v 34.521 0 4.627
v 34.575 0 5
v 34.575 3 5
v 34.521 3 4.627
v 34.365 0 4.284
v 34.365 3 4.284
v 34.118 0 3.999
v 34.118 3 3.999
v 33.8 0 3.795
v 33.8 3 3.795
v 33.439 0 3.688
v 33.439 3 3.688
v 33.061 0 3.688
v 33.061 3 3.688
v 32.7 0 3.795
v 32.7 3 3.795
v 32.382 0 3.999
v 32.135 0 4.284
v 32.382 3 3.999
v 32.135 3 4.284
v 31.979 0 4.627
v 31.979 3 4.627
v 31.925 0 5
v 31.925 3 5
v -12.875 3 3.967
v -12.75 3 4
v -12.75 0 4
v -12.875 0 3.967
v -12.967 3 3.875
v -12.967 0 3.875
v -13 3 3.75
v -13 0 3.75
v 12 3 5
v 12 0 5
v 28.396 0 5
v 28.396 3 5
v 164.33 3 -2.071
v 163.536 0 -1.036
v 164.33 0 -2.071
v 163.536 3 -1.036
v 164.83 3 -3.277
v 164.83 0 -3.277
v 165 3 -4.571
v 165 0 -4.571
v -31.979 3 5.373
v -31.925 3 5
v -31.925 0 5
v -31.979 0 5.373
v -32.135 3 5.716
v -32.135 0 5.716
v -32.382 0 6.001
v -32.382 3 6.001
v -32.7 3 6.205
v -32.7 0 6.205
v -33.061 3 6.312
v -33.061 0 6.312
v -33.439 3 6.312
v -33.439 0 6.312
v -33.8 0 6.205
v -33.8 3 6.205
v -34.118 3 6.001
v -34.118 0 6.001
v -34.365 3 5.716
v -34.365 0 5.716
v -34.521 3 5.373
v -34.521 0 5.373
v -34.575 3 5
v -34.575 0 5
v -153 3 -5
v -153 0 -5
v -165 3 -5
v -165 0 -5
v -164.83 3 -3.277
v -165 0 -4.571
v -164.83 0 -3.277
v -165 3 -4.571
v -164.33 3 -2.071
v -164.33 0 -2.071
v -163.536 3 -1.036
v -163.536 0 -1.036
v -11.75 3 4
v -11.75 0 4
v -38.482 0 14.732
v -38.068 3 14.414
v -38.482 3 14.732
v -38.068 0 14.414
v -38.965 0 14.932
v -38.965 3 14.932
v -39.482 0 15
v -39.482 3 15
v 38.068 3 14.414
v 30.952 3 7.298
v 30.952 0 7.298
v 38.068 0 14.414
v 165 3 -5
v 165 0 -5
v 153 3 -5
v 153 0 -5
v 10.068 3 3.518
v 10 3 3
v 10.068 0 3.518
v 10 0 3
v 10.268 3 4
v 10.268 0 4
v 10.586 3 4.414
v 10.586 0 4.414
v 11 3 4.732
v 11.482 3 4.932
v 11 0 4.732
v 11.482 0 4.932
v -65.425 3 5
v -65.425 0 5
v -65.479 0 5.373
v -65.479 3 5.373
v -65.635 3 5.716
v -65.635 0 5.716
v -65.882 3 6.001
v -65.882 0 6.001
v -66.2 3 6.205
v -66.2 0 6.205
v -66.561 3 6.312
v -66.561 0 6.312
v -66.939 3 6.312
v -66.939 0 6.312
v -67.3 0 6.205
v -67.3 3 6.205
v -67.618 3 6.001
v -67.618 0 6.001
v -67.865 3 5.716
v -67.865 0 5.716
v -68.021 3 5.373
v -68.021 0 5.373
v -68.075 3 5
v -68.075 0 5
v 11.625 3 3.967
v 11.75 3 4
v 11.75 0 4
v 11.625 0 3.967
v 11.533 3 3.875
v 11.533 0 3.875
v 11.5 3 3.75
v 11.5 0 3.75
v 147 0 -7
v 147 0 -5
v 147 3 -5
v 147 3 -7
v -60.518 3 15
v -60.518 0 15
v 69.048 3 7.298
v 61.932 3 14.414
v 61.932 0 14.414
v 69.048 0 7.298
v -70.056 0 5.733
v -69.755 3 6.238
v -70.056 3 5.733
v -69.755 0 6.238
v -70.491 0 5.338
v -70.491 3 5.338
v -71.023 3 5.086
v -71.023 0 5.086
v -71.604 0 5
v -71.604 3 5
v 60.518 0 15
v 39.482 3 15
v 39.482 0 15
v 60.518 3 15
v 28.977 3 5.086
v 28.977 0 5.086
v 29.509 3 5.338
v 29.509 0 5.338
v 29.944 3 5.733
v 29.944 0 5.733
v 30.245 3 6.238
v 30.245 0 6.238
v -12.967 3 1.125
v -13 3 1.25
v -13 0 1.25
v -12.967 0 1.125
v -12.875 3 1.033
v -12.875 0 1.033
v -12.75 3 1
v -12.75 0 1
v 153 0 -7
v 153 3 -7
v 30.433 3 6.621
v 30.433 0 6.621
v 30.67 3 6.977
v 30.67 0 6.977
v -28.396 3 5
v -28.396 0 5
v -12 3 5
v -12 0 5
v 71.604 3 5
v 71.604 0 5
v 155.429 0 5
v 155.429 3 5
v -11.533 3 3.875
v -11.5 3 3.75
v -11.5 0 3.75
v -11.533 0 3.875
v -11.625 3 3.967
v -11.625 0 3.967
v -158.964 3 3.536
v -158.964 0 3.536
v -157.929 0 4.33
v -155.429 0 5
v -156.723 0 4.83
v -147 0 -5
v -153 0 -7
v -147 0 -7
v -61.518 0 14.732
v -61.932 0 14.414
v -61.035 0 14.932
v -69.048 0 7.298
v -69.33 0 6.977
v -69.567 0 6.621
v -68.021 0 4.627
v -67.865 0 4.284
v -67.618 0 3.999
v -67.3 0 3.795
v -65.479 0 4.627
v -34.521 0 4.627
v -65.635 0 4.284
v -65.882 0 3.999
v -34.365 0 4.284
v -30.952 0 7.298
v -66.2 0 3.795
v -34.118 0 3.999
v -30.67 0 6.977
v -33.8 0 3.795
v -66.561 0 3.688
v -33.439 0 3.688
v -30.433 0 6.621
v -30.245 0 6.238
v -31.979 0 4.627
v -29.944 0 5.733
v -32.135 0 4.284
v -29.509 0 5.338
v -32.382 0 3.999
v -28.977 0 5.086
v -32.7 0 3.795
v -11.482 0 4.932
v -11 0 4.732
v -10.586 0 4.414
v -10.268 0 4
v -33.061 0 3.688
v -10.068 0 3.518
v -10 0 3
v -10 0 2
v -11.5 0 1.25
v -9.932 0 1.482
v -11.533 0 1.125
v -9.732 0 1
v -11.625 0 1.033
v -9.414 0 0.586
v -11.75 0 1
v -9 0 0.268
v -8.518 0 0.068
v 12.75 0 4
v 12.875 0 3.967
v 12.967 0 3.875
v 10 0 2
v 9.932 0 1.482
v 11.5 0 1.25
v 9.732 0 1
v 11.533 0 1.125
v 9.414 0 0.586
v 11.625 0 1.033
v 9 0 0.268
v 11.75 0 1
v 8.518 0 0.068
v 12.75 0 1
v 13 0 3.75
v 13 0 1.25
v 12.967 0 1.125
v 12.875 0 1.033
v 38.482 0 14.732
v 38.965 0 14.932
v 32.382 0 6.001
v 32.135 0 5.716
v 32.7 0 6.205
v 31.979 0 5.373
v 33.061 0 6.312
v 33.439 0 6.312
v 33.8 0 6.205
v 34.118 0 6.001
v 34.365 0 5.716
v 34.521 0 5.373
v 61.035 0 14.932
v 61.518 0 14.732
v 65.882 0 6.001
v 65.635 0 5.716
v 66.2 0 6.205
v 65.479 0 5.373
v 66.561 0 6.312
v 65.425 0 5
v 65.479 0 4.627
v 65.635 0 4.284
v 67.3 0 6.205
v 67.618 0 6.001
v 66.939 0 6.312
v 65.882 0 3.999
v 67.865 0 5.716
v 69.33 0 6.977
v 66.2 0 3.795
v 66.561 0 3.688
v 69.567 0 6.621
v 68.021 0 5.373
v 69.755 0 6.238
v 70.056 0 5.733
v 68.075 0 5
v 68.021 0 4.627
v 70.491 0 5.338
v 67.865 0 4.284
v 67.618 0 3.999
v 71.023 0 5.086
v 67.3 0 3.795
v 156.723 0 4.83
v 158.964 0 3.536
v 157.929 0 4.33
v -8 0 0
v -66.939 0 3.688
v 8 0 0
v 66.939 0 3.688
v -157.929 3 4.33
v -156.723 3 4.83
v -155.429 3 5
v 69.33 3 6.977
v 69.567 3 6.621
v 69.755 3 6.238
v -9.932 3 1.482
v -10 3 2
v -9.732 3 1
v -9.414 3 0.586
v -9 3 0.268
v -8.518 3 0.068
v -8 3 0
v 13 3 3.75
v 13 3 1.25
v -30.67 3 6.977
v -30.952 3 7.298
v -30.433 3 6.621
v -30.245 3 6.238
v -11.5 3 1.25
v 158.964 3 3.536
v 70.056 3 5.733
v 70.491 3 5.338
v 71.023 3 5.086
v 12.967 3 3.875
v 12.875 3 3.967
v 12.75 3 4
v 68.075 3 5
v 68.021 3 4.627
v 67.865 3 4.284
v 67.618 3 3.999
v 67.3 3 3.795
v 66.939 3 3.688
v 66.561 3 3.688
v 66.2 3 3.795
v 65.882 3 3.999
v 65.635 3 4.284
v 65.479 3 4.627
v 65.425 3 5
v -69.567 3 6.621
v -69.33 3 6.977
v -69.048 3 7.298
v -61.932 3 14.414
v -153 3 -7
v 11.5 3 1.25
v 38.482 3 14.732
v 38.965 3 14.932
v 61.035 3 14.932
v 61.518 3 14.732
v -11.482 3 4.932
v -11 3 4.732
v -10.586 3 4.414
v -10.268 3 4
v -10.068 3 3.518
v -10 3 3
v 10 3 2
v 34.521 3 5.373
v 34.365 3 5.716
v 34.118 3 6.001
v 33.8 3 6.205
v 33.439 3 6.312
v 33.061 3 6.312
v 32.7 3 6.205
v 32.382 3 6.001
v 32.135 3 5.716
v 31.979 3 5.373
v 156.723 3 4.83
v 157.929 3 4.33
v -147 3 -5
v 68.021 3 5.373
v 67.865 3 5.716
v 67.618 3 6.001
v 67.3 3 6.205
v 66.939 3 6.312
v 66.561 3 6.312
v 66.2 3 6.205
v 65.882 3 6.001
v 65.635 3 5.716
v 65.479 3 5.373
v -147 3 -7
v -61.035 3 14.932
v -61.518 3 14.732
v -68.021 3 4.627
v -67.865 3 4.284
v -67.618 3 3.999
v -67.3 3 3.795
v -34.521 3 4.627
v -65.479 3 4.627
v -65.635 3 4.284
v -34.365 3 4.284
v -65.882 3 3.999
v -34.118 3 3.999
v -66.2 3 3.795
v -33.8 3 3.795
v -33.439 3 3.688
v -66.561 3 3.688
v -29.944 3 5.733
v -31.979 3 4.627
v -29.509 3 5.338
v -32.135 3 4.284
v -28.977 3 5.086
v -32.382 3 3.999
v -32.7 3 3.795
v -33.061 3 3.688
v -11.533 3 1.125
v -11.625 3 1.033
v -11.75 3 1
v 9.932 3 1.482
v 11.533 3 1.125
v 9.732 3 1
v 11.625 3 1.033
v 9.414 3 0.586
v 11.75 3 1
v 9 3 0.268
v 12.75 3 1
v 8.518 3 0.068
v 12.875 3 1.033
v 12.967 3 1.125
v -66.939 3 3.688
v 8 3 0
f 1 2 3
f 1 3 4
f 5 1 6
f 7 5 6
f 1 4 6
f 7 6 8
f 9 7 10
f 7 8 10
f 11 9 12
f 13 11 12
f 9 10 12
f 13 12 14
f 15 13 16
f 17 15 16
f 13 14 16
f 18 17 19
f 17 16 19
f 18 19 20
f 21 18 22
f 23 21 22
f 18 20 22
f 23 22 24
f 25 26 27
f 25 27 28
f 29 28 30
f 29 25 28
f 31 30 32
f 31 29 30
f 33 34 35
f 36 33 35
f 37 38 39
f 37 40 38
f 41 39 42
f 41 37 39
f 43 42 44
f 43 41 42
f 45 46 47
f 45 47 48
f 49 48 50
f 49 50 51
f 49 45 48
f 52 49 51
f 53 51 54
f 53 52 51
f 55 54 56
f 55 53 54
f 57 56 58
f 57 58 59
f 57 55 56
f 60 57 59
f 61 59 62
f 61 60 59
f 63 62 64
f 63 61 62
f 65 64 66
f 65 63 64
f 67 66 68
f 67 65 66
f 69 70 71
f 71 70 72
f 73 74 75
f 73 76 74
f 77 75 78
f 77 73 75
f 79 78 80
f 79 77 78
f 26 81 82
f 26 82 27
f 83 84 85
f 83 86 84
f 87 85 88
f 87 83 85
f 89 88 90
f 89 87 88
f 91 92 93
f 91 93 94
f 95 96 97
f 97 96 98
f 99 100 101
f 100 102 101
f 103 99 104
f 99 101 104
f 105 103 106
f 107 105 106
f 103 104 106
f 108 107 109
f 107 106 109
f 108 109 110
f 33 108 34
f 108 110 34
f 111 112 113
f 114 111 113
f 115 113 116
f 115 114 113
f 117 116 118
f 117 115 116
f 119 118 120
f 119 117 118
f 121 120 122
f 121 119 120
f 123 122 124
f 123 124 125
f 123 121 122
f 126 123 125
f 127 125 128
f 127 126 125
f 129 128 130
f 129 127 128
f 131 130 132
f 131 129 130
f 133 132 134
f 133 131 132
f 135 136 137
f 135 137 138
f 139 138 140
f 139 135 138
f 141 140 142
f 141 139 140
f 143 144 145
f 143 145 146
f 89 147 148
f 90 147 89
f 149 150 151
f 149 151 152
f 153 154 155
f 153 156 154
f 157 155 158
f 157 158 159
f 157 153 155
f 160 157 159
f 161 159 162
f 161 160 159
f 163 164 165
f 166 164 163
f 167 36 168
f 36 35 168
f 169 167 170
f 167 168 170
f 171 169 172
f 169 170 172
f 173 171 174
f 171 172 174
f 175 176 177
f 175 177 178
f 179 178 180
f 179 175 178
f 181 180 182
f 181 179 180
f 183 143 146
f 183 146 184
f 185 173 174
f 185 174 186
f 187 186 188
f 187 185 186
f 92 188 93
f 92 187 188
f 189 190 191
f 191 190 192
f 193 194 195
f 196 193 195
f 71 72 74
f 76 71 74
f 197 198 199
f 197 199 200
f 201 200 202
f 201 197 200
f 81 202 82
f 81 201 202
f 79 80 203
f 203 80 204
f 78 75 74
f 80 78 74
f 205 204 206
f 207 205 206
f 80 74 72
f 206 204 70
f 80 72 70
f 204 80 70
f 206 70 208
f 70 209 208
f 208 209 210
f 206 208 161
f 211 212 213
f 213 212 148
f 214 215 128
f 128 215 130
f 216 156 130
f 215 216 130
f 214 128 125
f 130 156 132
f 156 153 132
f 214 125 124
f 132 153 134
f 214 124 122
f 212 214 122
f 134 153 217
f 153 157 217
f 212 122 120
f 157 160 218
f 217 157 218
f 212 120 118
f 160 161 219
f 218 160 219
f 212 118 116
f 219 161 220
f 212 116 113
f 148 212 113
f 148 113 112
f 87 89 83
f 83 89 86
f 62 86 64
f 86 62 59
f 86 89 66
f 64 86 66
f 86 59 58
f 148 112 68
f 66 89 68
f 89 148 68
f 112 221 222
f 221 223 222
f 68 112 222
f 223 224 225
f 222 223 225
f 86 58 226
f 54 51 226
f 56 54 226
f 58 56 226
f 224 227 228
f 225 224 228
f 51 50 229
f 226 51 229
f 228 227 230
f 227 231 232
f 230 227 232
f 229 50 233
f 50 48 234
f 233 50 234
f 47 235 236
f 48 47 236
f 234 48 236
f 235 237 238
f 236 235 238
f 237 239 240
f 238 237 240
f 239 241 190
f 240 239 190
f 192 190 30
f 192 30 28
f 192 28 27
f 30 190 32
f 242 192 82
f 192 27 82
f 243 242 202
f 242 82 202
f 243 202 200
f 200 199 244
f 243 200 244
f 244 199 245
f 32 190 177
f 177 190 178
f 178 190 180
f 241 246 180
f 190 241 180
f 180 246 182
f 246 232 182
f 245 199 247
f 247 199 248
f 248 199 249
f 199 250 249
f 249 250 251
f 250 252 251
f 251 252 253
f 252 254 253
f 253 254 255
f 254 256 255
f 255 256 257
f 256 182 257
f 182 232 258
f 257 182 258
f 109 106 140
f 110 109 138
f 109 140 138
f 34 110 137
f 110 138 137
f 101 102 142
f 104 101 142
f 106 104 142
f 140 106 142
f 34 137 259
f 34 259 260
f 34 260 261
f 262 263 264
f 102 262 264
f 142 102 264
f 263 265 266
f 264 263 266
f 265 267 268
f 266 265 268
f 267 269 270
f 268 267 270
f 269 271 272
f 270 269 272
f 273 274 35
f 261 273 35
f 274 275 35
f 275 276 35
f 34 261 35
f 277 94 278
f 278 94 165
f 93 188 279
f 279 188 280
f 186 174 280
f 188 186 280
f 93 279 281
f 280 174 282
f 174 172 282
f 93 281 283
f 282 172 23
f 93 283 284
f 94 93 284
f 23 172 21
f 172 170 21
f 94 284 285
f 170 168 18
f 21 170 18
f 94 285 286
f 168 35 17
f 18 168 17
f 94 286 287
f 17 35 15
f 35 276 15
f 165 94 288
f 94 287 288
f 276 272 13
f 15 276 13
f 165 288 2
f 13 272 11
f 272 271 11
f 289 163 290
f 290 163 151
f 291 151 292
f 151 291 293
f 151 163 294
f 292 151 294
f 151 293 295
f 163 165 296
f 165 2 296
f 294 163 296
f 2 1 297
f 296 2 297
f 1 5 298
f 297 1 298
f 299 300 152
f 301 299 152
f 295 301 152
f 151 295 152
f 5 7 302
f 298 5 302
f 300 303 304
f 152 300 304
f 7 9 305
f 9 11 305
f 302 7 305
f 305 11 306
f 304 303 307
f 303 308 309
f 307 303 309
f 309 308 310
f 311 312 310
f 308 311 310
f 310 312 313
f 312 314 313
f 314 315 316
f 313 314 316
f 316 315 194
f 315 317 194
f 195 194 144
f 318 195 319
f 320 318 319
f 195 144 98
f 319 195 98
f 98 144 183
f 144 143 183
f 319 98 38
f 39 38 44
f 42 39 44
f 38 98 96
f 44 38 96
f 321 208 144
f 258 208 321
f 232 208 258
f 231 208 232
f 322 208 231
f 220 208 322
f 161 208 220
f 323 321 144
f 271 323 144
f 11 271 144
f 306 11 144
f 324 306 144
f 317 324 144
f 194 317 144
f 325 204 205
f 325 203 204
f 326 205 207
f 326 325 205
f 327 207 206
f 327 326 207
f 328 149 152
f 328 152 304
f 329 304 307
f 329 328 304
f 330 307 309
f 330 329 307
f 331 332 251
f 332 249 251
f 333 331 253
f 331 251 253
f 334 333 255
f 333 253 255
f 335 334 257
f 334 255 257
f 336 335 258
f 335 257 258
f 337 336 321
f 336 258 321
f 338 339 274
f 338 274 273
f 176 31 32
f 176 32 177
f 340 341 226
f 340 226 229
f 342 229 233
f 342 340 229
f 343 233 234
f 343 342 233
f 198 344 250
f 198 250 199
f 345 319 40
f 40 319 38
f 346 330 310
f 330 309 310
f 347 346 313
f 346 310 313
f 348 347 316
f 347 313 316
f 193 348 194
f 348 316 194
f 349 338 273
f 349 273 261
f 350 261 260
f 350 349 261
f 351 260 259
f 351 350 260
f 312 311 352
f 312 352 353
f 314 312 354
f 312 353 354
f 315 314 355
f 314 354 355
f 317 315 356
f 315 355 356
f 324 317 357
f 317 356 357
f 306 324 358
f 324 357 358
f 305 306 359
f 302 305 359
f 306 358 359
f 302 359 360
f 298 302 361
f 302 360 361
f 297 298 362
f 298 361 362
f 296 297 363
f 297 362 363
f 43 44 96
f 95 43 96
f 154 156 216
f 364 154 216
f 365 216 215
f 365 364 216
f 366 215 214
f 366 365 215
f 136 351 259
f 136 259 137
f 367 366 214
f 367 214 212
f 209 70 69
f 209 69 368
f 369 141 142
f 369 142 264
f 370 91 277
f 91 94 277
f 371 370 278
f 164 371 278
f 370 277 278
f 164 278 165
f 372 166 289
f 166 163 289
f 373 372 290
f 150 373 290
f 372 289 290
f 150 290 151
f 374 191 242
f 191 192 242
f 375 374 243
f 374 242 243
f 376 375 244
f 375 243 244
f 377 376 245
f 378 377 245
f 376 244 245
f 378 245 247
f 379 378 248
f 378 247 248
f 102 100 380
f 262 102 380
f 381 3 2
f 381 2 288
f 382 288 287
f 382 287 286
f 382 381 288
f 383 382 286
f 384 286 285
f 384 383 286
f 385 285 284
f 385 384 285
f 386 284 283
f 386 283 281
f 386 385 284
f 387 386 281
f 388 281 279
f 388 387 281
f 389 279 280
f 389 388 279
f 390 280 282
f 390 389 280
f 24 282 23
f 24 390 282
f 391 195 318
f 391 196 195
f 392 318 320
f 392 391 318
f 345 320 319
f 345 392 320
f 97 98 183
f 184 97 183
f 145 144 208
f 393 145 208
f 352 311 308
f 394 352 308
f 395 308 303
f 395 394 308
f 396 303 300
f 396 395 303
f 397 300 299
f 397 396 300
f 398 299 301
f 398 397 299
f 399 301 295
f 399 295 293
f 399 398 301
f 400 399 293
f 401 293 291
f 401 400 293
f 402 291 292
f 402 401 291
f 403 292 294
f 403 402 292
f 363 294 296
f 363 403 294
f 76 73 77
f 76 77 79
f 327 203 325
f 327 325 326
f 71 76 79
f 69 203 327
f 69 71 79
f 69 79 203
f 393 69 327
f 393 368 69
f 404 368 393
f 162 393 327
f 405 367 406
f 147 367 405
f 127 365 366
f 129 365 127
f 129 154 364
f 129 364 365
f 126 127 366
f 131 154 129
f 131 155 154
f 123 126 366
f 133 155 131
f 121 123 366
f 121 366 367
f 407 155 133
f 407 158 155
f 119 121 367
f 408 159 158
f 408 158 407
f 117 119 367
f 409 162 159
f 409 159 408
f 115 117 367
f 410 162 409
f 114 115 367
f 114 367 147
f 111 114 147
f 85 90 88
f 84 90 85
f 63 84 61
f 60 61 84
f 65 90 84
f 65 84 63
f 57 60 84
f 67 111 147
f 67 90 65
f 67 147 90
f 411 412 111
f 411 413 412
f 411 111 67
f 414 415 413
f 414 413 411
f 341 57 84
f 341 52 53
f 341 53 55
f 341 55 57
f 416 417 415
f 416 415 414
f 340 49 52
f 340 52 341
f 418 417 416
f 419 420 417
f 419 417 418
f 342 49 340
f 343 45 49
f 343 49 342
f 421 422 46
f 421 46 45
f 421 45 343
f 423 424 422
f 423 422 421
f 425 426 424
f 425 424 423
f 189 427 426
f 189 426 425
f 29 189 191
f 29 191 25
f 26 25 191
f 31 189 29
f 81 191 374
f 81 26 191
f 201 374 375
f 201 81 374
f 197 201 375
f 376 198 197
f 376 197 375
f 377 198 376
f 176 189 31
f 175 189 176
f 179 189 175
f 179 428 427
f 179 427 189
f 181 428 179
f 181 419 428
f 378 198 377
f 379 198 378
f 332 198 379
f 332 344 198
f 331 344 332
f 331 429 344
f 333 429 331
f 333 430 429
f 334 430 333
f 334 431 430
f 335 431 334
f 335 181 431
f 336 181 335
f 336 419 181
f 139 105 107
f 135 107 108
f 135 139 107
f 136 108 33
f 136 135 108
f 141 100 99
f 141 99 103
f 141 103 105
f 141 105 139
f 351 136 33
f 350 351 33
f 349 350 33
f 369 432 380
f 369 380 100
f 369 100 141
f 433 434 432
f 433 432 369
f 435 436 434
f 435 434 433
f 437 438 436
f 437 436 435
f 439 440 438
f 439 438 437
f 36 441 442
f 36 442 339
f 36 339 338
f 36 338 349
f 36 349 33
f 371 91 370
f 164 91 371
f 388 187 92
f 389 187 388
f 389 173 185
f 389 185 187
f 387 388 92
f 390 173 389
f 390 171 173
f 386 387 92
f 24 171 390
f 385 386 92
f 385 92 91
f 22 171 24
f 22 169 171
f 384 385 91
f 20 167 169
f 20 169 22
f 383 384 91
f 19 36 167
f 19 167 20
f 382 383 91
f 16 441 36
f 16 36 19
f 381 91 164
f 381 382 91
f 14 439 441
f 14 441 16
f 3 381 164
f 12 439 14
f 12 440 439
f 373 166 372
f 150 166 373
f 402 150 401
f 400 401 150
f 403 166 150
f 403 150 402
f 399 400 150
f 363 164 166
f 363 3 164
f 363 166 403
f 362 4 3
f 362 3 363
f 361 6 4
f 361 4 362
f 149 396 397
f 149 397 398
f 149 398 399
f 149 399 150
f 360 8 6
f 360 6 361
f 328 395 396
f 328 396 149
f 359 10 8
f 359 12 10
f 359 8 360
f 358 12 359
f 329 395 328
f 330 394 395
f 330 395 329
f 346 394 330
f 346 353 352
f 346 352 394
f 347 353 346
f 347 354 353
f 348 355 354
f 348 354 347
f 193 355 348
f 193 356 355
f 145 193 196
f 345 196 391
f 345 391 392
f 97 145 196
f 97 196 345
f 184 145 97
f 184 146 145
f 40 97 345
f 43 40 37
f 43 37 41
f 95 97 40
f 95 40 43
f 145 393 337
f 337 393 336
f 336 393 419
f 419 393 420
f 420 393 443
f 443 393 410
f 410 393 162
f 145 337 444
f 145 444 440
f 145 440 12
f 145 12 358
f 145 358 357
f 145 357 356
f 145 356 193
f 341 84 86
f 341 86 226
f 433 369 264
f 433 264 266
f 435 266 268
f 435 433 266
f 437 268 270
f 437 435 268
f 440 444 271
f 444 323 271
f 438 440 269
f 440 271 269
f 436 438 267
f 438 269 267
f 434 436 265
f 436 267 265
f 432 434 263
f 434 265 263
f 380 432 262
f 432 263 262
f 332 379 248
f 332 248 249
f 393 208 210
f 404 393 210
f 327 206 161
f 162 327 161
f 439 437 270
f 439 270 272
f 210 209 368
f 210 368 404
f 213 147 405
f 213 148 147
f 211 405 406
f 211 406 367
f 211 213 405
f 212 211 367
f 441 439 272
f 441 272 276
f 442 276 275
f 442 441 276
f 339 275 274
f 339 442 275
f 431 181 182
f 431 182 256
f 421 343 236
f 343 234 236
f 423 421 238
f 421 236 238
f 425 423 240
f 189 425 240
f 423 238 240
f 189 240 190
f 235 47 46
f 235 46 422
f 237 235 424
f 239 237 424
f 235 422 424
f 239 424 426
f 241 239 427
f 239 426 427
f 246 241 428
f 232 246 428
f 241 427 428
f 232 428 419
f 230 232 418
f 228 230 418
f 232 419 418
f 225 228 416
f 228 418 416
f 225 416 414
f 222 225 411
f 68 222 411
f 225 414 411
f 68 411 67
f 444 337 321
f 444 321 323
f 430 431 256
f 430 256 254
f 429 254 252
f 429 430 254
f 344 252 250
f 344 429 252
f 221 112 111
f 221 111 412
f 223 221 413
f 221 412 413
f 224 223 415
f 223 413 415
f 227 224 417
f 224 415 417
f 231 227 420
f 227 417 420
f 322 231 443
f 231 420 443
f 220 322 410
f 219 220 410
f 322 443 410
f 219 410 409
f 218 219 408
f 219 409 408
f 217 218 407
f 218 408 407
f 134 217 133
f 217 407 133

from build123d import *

# Parameters (mm, degrees)
SKETCH1_W           = 6
SKETCH1_H           = 2
BOSS_EXTRUDE1_DEPTH = 3
FILLET1_R           = 5
BOSS_EXTRUDE2_DEPTH = 3
CUT_EXTRUDE1_REACH  = 167.708
SKETCH3_R           = 1.325
SKETCH3_W           = 20
SKETCH3_H           = 5
FILLET2_R           = 2
FILLET3_R           = 2


with BuildPart() as part:
    # Sketch1 → Boss-Extrude1 (new body)
    with BuildSketch(Plane(origin=(0, 0, 0), x_dir=(1, 0, 0), z_dir=(0, 1, 0))):
        Polygon((-153, 5), (-165, 5), (-165, 2.5), (-157.5, -5), (157.5, -5), (165, 2.5), (165, 5), (153, 5), (147, 5), (-147, 5), align=None)
        with Locations((-150, 6)):
            Rectangle(SKETCH1_W, SKETCH1_H)
        with Locations((150, 6)):
            Rectangle(SKETCH1_W, SKETCH1_H)
    extrude(amount=BOSS_EXTRUDE1_DEPTH)

    # Fillet1
    fillet1_edges = [part.edges().sort_by_distance(p)[0] for p in [
        (157.5, 1.5, 5),
        (-157.5, 1.5, 5),
        (-165, 1.5, -2.5),
        (165, 1.5, -2.5),
    ]]
    fillet(fillet1_edges, radius=FILLET1_R)

    # Sketch2 → Boss-Extrude2 (add)
    with BuildSketch(Plane(origin=(0, 3, 0), x_dir=(1, 0, 0), z_dir=(0, 1, 0))):
        with BuildLine():
            Line((-38.653805922, -15), (-30.951902961, -7.298097039))
            ThreePointArc((-30.951902961, -7.298097039), (-34.493721155, -8.002608481), (-36.5, -5))
            Line((-36.5, -5), (-63.5, -5))
            ThreePointArc((-63.5, -5), (-65.506278845, -8.002608481), (-69.048097039, -7.298097039))
            Line((-69.048097039, -7.298097039), (-61.346194078, -15))
            Line((-61.346194078, -15), (-38.653805922, -15))
        make_face()
        with BuildLine():
            Line((-65.425, -5), (-63.5, -5))
            ThreePointArc((-63.5, -5), (-66.75, -1.75), (-70, -5))
            Line((-70, -5), (-68.075, -5))
            ThreePointArc((-68.075, -5), (-66.75, -3.675), (-65.425, -5))
        make_face()
        with BuildLine():
            ThreePointArc((-69.048097039, -7.298097039), (-65.506278845, -8.002608481), (-63.5, -5))
            Line((-63.5, -5), (-65.425, -5))
            ThreePointArc((-65.425, -5), (-66.75, -6.325), (-68.075, -5))
            Line((-68.075, -5), (-70, -5))
            ThreePointArc((-70, -5), (-69.752608481, -6.243721155), (-69.048097039, -7.298097039))
        make_face()
        with BuildLine():
            ThreePointArc((-30.951902961, -7.298097039), (-30.247391519, -6.243721155), (-30, -5))
            Line((-30, -5), (-31.925, -5))
            ThreePointArc((-31.925, -5), (-33.25, -6.325), (-34.575, -5))
            Line((-34.575, -5), (-36.5, -5))
            ThreePointArc((-36.5, -5), (-34.493721155, -8.002608481), (-30.951902961, -7.298097039))
        make_face()
        with BuildLine():
            Line((-31.925, -5), (-30, -5))
            ThreePointArc((-30, -5), (-33.25, -1.75), (-36.5, -5))
            Line((-36.5, -5), (-34.575, -5))
            ThreePointArc((-34.575, -5), (-33.25, -3.675), (-31.925, -5))
        make_face()
        with BuildLine():
            Line((61.346194078, -15), (69.048097039, -7.298097039))
            ThreePointArc((69.048097039, -7.298097039), (65.506278845, -8.002608481), (63.5, -5))
            Line((63.5, -5), (36.5, -5))
            ThreePointArc((36.5, -5), (34.493721155, -8.002608481), (30.951902961, -7.298097039))
            Line((30.951902961, -7.298097039), (38.653805922, -15))
            Line((38.653805922, -15), (61.346194078, -15))
        make_face()
        with BuildLine():
            Line((31.925, -5), (30, -5))
            ThreePointArc((30, -4.999999997), (30.247391519, -6.243721154), (30.951902961, -7.298097039))
            ThreePointArc((30.951902961, -7.298097039), (34.493721155, -8.002608481), (36.5, -5))
            Line((36.5, -5), (34.575, -5))
            ThreePointArc((34.575, -5), (33.25, -6.325), (31.925, -5))
        make_face()
        with BuildLine():
            ThreePointArc((36.5, -5), (33.250000002, -1.75), (30, -4.999999997))
            Line((30, -5), (31.925, -5))
            ThreePointArc((31.925, -5), (33.25, -3.675), (34.575, -5))
            Line((34.575, -5), (36.5, -5))
        make_face()
        with BuildLine():
            Line((68.075, -5), (70, -5))
            ThreePointArc((70, -5), (66.75, -1.75), (63.5, -5))
            Line((63.5, -5), (65.425, -5))
            ThreePointArc((65.425, -5), (66.75, -3.675), (68.075, -5))
        make_face()
        with BuildLine():
            ThreePointArc((69.048097039, -7.298097039), (69.752608481, -6.243721155), (70, -5))
            Line((70, -5), (68.075, -5))
            ThreePointArc((68.075, -5), (66.75, -6.325), (65.425, -5))
            Line((65.425, -5), (63.5, -5))
            ThreePointArc((63.5, -5), (65.506278845, -8.002608481), (69.048097039, -7.298097039))
        make_face()
    extrude(amount=-BOSS_EXTRUDE2_DEPTH)

    # Sketch3 → Cut-Extrude1 (cut, up to next)
    with BuildSketch(Plane(origin=(0, 3, 0), x_dir=(1, 0, 0), z_dir=(0, 1, 0)), mode=Mode.PRIVATE) as cut_extrude1_sk1:
        with Locations(Location((-66.75, -5, 0), (0, 0, 270))):
            Circle(SKETCH3_R)
    cut_extrude1_tool1 = extrude(cut_extrude1_sk1.sketch, amount=-CUT_EXTRUDE1_REACH, mode=Mode.PRIVATE) & part.part
    # Sketch3 → Cut-Extrude1 (cut, up to next)
    with BuildSketch(Plane(origin=(0, 3, 0), x_dir=(1, 0, 0), z_dir=(0, 1, 0)), mode=Mode.PRIVATE) as cut_extrude1_sk2:
        with Locations(Location((-33.25, -5, 0), (0, 0, 270))):
            Circle(SKETCH3_R)
    cut_extrude1_tool2 = extrude(cut_extrude1_sk2.sketch, amount=-CUT_EXTRUDE1_REACH, mode=Mode.PRIVATE) & part.part
    # Sketch3 → Cut-Extrude1 (cut, up to next)
    with BuildSketch(Plane(origin=(0, 3, 0), x_dir=(1, 0, 0), z_dir=(0, 1, 0)), mode=Mode.PRIVATE) as cut_extrude1_sk3:
        with Locations(Location((33.25, -5, 0), (0, 0, 270))):
            Circle(SKETCH3_R)
    cut_extrude1_tool3 = extrude(cut_extrude1_sk3.sketch, amount=-CUT_EXTRUDE1_REACH, mode=Mode.PRIVATE) & part.part
    # Sketch3 → Cut-Extrude1 (cut, up to next)
    with BuildSketch(Plane(origin=(0, 3, 0), x_dir=(1, 0, 0), z_dir=(0, 1, 0)), mode=Mode.PRIVATE) as cut_extrude1_sk4:
        with Locations(Location((66.75, -5, 0), (0, 0, 270))):
            Circle(SKETCH3_R)
    cut_extrude1_tool4 = extrude(cut_extrude1_sk4.sketch, amount=-CUT_EXTRUDE1_REACH, mode=Mode.PRIVATE) & part.part
    # Sketch3 → Cut-Extrude1 (cut, up to next)
    with BuildSketch(Plane(origin=(0, 3, 0), x_dir=(1, 0, 0), z_dir=(0, 1, 0)), mode=Mode.PRIVATE) as cut_extrude1_sk5:
        with Locations((0, -2.5)):
            Rectangle(SKETCH3_W, SKETCH3_H)
    cut_extrude1_tool5 = extrude(cut_extrude1_sk5.sketch, amount=-CUT_EXTRUDE1_REACH, mode=Mode.PRIVATE) & part.part
    # Sketch3 → Cut-Extrude1 (cut, up to next)
    with BuildSketch(Plane(origin=(0, 3, 0), x_dir=(1, 0, 0), z_dir=(0, 1, 0)), mode=Mode.PRIVATE) as cut_extrude1_sk6:
        with BuildLine():
            Line((13, -1.25), (13, -3.75))
            ThreePointArc((13, -3.75), (12.926776695, -3.926776695), (12.75, -4))
            Line((12.75, -4), (11.75, -4))
            ThreePointArc((11.75, -4), (11.573223305, -3.926776695), (11.5, -3.75))
            Line((11.5, -3.75), (11.5, -1.25))
            ThreePointArc((11.5, -1.25), (11.573223305, -1.073223305), (11.75, -1))
            Line((11.75, -1), (12.75, -1))
            ThreePointArc((12.75, -1), (12.926776695, -1.073223305), (13, -1.25))
        make_face()
    cut_extrude1_tool6 = extrude(cut_extrude1_sk6.sketch, amount=-CUT_EXTRUDE1_REACH, mode=Mode.PRIVATE) & part.part
    # Sketch3 → Cut-Extrude1 (cut, up to next)
    with BuildSketch(Plane(origin=(0, 3, 0), x_dir=(1, 0, 0), z_dir=(0, 1, 0)), mode=Mode.PRIVATE) as cut_extrude1_sk7:
        with BuildLine():
            Line((-12.75, -1), (-11.75, -1))
            ThreePointArc((-11.75, -1), (-11.573223305, -1.073223305), (-11.5, -1.25))
            Line((-11.5, -1.25), (-11.5, -3.75))
            ThreePointArc((-11.5, -3.75), (-11.573223305, -3.926776695), (-11.75, -4))
            Line((-11.75, -4), (-12.75, -4))
            ThreePointArc((-12.75, -4), (-12.926776695, -3.926776695), (-13, -3.75))
            Line((-13, -3.75), (-13, -1.25))
            ThreePointArc((-13, -1.25), (-12.926776695, -1.073223305), (-12.75, -1))
        make_face()
    cut_extrude1_tool7 = extrude(cut_extrude1_sk7.sketch, amount=-CUT_EXTRUDE1_REACH, mode=Mode.PRIVATE) & part.part
    add(cut_extrude1_tool1.solids().sort_by_distance((-66.75, 3, 5))[0], mode=Mode.SUBTRACT)
    add(cut_extrude1_tool2.solids().sort_by_distance((-33.25, 3, 5))[0], mode=Mode.SUBTRACT)
    add(cut_extrude1_tool3.solids().sort_by_distance((33.25, 3, 5))[0], mode=Mode.SUBTRACT)
    add(cut_extrude1_tool4.solids().sort_by_distance((66.75, 3, 5))[0], mode=Mode.SUBTRACT)
    add(cut_extrude1_tool5.solids().sort_by_distance((0, 3, 2.5))[0], mode=Mode.SUBTRACT)
    add(cut_extrude1_tool6.solids().sort_by_distance((12.25, 3, 2.5))[0], mode=Mode.SUBTRACT)
    add(cut_extrude1_tool7.solids().sort_by_distance((-12.25, 3, 2.5))[0], mode=Mode.SUBTRACT)

    # Fillet2
    fillet2_edges = [part.edges().sort_by_distance(p)[0] for p in [
        (-30, 1.5, 5),
        (-70, 1.5, 5),
        (-61.346194078, 1.5, 15),
        (-38.653805922, 1.5, 15),
        (61.346194078, 1.5, 15),
        (38.653805922, 1.5, 15),
        (30, 1.5, 5),
        (70, 1.5, 5),
    ]]
    fillet(fillet2_edges, radius=FILLET2_R)

    # Fillet3
    fillet3_edges = [part.edges().sort_by_distance(p)[0] for p in [
        (10, 1.5, 0),
        (10, 1.5, 5),
        (-10, 1.5, 5),
        (-10, 1.5, 0),
    ]]
    fillet(fillet3_edges, radius=FILLET3_R)


solid = part.part
